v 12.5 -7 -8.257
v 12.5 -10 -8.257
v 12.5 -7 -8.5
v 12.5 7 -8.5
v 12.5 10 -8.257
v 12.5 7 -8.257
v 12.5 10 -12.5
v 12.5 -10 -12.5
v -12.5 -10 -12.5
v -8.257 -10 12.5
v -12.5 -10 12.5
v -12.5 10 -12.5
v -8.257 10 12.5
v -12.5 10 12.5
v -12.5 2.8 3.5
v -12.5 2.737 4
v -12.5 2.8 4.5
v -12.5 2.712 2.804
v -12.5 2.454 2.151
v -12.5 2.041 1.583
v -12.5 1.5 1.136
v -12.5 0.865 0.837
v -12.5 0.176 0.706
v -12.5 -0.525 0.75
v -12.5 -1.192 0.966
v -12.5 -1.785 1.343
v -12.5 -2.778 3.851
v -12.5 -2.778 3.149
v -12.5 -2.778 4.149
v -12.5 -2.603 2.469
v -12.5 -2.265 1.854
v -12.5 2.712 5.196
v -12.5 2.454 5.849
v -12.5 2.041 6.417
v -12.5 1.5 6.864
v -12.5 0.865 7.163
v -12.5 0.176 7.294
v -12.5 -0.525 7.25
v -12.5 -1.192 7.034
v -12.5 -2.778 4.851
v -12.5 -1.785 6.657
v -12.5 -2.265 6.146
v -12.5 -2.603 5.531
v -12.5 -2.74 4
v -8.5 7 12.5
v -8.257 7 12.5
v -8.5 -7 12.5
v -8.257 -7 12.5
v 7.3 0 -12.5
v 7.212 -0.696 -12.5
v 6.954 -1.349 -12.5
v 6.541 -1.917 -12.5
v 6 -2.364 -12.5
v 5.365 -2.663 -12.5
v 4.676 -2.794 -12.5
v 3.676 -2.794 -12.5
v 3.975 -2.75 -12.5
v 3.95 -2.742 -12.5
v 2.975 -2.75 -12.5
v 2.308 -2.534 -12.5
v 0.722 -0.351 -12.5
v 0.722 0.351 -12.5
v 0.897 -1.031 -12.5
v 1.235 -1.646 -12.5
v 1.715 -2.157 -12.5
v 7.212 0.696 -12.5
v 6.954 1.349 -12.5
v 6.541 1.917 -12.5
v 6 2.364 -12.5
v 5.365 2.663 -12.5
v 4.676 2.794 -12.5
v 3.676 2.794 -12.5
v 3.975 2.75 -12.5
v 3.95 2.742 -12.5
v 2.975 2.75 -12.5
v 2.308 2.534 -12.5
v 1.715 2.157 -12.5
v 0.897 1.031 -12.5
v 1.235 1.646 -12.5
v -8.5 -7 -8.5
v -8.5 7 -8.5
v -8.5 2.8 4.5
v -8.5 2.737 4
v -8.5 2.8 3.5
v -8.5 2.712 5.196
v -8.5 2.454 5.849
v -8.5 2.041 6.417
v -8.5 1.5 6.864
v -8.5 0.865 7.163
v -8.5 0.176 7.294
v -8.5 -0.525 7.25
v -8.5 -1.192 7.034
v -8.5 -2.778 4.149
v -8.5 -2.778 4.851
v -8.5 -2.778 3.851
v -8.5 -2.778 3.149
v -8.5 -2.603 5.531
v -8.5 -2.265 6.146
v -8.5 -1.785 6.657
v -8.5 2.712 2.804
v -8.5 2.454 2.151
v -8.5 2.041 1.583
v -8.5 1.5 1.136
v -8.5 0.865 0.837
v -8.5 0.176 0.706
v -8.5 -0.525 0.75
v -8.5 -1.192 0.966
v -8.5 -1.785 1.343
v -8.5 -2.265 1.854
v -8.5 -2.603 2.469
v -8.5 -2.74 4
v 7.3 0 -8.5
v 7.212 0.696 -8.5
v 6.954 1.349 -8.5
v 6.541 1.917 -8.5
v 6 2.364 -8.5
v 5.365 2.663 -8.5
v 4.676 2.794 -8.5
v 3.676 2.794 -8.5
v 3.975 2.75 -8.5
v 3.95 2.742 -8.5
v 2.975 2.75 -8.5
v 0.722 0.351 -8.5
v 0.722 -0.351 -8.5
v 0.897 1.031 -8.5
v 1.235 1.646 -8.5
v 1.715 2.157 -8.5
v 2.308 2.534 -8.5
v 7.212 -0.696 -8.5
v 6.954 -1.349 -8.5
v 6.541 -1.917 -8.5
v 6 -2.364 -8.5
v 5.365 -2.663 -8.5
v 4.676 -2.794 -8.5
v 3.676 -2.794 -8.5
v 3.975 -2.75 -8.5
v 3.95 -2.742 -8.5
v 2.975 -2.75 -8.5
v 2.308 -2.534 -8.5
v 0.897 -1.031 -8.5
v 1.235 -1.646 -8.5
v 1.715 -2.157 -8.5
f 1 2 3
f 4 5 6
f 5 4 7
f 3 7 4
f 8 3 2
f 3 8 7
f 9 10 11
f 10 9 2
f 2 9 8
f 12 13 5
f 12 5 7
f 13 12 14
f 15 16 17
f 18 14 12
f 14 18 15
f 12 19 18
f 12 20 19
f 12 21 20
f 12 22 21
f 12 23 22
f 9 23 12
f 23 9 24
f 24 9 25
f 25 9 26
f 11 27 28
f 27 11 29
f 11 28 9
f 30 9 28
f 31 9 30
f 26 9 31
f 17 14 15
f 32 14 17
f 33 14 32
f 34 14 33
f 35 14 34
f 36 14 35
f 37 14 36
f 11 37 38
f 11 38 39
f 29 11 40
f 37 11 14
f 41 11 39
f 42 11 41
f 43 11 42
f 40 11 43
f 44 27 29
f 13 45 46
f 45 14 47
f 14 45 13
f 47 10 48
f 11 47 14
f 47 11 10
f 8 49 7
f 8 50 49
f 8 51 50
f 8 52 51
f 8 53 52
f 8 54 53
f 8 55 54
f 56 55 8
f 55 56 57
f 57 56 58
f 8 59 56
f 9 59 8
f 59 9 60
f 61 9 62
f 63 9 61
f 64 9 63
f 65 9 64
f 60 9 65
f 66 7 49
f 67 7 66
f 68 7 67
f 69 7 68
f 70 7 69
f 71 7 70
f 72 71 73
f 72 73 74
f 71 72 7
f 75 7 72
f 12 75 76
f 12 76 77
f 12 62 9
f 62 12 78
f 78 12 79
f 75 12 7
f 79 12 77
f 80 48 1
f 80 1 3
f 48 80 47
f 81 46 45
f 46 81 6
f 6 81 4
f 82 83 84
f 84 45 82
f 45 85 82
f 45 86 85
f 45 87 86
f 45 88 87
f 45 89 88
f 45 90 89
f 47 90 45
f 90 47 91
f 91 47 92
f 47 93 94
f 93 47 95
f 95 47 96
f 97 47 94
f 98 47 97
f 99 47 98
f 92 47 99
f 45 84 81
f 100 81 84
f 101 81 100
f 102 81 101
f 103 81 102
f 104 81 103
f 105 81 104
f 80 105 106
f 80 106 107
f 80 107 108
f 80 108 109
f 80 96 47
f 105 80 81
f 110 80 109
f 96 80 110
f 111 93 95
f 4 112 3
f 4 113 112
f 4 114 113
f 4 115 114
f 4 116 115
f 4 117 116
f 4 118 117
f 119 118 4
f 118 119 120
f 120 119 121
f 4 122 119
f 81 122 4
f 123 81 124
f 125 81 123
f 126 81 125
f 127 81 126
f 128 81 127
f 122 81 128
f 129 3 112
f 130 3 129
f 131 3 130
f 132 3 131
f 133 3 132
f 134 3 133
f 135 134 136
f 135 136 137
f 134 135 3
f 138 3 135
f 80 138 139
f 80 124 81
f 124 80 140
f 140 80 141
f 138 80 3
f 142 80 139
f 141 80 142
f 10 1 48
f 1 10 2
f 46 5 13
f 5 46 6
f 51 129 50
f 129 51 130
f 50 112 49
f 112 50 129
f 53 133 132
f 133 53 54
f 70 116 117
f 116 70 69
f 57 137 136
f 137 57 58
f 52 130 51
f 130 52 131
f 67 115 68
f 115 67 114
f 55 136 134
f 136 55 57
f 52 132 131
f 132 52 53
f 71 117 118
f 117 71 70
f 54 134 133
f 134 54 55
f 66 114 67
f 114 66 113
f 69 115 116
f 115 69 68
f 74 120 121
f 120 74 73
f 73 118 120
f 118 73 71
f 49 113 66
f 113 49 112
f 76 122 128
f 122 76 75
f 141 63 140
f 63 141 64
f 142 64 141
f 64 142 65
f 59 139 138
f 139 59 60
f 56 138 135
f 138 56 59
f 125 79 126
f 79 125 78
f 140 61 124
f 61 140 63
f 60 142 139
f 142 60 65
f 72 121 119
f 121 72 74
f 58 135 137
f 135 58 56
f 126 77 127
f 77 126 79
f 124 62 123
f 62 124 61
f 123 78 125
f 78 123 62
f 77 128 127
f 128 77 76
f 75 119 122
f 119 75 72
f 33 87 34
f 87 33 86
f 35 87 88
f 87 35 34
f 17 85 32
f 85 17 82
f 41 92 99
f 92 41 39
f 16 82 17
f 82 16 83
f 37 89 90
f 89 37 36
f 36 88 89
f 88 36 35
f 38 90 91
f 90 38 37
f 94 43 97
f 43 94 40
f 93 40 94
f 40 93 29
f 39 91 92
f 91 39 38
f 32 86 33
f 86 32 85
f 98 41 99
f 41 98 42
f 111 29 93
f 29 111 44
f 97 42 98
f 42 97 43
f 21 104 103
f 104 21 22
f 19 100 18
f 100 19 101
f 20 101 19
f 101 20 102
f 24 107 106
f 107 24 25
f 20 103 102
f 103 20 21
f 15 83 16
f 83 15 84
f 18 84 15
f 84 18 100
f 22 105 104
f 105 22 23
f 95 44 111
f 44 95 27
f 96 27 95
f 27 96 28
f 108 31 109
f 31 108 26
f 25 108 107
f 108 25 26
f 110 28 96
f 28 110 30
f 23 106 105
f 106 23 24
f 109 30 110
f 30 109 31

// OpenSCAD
// 90 degree bracket

$fn = 25;
length = 25;  // default 45
width = 20;
walls = 3;

rHole = 2.8;

rotate([90, 0, 0])
difference()
{
    cube([length, length, width], center=true);
    
    translate([4, 4, 0])
    cube([length, length, width-(walls * 2)], center=true);
    
    rotate([0,0,45])
    translate([length/2 + 3, 0, 0])
    cube([length, length + 20, width+2], center= true);
    
    // bottom screw holes
    translate([length/2 - 8, -length/2 + 5, 0])
    rotate([90, 0, 0])
    #cylinder(r=rHole, h=10);

    translate([-length/2 + 16, -length/2 + 5, 0])
    rotate([90, 0, 0])
    #cylinder(r=rHole, h=10);
    
    
    // side screw holes
    translate([-length/2 - 5, length/2 - 8, 0])
    rotate([0, 90, 0])
    #cylinder(r=rHole, h=10);

    translate([-length/2 - 5, -length/2 + 16, 0])
    rotate([0, 90, 0])
    #cylinder(r=rHole, h=10);
}
